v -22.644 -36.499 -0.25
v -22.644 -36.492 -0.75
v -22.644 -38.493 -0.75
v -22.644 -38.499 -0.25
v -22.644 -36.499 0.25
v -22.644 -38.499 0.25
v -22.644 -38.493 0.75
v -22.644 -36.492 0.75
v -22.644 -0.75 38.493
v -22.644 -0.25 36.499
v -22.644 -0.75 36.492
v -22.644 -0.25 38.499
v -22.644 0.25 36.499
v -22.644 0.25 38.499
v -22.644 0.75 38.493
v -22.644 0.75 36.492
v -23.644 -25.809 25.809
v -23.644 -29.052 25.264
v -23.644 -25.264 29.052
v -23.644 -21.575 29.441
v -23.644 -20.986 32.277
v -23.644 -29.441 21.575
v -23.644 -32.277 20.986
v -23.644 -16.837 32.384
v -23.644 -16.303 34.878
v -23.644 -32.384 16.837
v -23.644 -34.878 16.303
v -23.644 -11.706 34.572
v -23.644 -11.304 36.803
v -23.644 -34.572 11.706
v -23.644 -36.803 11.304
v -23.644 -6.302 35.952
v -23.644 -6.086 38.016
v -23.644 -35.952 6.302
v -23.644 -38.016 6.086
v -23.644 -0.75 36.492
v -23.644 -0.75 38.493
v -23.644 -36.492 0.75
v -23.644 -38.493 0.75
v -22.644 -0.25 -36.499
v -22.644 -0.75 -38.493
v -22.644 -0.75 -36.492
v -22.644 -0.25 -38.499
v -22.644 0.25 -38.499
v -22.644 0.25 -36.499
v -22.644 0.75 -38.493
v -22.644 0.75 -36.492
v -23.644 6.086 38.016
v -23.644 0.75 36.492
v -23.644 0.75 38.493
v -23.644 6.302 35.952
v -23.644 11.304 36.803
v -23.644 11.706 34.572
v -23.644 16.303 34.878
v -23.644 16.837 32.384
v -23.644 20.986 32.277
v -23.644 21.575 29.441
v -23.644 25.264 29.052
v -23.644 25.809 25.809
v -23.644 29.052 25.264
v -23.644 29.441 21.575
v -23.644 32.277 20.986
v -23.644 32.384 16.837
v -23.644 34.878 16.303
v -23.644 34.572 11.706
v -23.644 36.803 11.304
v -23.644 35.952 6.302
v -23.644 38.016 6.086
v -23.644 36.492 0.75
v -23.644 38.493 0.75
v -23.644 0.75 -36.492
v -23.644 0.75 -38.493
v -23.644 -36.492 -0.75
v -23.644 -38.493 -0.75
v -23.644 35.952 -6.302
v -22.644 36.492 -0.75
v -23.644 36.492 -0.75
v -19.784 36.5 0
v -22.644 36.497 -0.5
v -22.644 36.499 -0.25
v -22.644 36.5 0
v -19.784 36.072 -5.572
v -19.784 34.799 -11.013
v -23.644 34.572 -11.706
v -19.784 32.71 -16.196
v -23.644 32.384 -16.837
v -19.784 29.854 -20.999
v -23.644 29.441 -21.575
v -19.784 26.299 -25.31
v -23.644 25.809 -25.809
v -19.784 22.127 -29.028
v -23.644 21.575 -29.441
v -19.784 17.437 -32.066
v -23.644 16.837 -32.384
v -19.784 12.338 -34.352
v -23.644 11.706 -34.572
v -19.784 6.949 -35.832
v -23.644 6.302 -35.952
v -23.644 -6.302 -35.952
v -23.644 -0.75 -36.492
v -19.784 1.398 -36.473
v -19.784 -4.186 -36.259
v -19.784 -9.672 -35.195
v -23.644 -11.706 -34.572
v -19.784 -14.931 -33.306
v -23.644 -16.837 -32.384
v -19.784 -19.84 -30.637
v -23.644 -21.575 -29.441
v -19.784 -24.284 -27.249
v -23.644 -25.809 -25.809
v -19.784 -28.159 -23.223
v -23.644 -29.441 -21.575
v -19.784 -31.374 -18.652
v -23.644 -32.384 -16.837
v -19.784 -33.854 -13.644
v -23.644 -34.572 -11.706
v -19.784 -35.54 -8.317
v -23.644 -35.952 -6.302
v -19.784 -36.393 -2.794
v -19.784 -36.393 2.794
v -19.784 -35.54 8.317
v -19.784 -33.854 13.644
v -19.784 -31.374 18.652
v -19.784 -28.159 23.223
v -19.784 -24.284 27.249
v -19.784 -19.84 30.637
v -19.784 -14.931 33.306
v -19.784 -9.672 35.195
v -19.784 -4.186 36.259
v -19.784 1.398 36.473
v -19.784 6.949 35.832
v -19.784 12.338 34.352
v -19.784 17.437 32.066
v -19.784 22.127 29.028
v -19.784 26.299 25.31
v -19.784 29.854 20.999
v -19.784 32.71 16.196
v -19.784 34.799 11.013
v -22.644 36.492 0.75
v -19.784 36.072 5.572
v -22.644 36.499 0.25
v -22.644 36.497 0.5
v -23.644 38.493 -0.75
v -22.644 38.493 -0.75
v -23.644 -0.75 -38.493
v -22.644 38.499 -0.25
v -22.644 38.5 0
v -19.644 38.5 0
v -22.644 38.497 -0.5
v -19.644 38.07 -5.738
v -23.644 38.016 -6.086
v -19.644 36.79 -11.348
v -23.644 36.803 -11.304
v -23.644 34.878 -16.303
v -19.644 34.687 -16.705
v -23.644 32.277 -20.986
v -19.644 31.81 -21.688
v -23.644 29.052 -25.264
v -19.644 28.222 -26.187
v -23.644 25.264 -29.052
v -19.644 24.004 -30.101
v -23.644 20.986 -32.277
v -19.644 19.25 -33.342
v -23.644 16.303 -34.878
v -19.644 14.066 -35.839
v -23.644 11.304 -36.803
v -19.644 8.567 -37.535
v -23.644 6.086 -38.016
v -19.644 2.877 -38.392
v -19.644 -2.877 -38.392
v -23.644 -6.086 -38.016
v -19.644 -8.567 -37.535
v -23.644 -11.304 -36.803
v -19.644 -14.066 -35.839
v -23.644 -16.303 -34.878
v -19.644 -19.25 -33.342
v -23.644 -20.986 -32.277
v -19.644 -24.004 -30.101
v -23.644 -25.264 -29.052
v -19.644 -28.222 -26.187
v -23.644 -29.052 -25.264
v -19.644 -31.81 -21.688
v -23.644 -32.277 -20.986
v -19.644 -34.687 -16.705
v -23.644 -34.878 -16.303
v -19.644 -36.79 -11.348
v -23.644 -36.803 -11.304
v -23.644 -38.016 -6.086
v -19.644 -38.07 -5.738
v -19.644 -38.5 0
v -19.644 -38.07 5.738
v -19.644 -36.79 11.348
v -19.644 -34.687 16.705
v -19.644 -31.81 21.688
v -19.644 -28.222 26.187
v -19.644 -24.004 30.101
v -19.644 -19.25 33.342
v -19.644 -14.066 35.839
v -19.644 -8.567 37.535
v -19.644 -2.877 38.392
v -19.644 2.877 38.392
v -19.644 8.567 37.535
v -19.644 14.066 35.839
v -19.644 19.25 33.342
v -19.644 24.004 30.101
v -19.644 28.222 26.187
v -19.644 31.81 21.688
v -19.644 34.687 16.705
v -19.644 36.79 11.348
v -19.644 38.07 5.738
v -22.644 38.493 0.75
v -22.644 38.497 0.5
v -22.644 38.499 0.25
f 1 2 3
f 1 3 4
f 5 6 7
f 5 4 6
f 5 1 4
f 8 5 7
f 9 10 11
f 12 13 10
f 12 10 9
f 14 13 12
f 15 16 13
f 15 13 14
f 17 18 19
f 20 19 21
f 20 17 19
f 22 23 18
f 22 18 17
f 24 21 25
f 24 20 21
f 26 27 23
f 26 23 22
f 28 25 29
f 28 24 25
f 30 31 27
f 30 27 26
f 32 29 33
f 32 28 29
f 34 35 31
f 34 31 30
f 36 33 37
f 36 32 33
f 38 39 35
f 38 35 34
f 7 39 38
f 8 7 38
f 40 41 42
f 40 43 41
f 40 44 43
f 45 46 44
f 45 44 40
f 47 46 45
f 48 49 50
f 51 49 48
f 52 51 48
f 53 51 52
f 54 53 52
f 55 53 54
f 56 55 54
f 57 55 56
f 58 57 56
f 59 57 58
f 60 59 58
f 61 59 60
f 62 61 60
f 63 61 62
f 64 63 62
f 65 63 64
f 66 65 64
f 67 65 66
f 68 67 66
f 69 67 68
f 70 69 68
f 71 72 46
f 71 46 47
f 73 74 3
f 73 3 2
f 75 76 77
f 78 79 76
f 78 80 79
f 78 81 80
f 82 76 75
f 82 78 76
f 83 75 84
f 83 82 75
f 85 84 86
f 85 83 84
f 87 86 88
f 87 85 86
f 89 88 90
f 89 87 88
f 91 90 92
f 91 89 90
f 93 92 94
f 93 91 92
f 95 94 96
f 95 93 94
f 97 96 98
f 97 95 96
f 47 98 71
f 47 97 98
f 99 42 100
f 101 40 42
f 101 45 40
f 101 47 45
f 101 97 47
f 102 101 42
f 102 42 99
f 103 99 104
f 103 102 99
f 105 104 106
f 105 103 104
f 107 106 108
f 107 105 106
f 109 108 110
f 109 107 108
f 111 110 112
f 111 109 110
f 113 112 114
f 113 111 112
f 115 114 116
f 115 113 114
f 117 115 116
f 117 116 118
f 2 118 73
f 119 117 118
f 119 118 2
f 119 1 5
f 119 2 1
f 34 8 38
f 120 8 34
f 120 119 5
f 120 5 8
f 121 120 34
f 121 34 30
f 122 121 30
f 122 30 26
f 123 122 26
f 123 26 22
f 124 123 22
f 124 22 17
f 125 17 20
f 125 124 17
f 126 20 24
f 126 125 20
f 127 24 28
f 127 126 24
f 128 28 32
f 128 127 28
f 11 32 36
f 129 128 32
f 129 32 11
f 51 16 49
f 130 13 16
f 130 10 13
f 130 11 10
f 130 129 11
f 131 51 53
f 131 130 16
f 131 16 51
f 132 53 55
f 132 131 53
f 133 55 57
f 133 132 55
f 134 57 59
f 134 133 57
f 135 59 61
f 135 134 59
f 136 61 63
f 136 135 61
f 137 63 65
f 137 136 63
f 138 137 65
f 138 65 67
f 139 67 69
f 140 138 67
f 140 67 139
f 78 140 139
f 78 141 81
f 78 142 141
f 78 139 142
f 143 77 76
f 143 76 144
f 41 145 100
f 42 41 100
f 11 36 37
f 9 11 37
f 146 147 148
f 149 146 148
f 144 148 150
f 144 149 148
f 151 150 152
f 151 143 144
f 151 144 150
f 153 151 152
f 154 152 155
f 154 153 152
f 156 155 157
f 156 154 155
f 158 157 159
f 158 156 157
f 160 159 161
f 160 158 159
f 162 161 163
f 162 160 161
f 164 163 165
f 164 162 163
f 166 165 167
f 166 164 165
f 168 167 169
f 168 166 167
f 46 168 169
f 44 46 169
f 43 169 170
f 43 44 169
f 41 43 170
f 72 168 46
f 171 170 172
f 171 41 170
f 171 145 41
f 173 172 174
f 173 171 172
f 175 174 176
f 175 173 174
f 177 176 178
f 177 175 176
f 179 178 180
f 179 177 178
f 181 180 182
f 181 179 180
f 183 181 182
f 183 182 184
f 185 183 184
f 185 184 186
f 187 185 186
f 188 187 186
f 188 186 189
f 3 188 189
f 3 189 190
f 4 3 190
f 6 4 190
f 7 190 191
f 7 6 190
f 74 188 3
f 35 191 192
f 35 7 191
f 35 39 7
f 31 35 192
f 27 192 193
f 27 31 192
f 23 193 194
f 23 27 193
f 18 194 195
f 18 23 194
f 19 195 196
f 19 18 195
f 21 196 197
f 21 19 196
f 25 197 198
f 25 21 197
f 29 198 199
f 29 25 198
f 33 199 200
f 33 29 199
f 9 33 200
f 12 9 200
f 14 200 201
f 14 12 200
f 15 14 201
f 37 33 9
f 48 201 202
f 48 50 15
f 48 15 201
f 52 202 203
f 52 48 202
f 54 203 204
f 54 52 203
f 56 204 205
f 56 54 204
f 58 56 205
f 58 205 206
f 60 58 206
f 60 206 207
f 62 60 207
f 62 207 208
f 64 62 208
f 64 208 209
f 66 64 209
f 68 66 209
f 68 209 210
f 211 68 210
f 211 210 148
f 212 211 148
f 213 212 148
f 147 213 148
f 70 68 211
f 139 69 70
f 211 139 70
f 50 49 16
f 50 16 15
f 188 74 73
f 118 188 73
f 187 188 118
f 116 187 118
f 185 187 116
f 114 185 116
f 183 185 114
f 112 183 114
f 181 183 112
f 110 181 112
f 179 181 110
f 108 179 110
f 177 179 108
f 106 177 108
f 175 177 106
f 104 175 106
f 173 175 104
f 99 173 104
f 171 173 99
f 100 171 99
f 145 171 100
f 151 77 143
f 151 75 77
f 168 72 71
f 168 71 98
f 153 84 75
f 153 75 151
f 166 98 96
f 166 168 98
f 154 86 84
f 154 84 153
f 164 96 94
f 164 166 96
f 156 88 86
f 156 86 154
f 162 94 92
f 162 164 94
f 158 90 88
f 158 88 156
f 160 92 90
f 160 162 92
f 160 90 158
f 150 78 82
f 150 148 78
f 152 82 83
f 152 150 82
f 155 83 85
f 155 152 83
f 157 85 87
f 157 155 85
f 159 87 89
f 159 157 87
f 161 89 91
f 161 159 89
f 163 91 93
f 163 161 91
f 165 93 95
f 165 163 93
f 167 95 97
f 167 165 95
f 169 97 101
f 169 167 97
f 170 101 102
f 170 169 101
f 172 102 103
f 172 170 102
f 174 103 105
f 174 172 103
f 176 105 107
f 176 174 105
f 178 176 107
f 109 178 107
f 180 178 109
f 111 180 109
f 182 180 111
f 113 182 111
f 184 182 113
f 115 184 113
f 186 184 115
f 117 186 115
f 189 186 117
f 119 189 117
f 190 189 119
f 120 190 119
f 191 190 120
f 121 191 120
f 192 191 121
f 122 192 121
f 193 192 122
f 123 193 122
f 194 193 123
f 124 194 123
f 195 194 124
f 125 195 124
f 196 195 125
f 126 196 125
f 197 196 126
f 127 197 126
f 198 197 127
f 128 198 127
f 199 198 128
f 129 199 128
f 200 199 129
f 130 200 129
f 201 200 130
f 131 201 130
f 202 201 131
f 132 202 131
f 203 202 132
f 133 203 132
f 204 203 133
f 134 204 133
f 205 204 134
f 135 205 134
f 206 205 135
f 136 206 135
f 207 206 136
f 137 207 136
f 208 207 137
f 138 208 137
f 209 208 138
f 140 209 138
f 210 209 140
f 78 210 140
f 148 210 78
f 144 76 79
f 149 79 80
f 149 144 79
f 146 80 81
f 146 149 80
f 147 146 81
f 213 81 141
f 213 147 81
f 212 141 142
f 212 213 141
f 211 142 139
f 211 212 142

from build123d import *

# Parameters (mm, degrees)
SKICA2_W                 = 1.5
SKICA2_H                 = 77
SKICA2_W_2               = 77
SKICA2_H_2               = 1.5
ODEBRAT_VYSUNUT_M1_DEPTH = 1


with BuildPart() as part:
    # Skica1 → Rotovat1 (revolve)
    with BuildSketch(Plane.XY):
        Polygon((-23.64396546, 38.5), (-23.64396546, 36.5), (-19.783819083, 36.5), (-19.64396546, 38.5), align=None)
    revolve(axis=Axis((0, 0, 0), (-1, 0, 0)))

    # Skica2 → Odebrat vysunutím1 (cut)
    with BuildSketch(Plane.ZY.offset(23.64396546)):
        Rectangle(SKICA2_W, SKICA2_H)
        Rectangle(SKICA2_W_2, SKICA2_H_2)
    extrude(amount=-ODEBRAT_VYSUNUT_M1_DEPTH, mode=Mode.SUBTRACT)


solid = part.part
